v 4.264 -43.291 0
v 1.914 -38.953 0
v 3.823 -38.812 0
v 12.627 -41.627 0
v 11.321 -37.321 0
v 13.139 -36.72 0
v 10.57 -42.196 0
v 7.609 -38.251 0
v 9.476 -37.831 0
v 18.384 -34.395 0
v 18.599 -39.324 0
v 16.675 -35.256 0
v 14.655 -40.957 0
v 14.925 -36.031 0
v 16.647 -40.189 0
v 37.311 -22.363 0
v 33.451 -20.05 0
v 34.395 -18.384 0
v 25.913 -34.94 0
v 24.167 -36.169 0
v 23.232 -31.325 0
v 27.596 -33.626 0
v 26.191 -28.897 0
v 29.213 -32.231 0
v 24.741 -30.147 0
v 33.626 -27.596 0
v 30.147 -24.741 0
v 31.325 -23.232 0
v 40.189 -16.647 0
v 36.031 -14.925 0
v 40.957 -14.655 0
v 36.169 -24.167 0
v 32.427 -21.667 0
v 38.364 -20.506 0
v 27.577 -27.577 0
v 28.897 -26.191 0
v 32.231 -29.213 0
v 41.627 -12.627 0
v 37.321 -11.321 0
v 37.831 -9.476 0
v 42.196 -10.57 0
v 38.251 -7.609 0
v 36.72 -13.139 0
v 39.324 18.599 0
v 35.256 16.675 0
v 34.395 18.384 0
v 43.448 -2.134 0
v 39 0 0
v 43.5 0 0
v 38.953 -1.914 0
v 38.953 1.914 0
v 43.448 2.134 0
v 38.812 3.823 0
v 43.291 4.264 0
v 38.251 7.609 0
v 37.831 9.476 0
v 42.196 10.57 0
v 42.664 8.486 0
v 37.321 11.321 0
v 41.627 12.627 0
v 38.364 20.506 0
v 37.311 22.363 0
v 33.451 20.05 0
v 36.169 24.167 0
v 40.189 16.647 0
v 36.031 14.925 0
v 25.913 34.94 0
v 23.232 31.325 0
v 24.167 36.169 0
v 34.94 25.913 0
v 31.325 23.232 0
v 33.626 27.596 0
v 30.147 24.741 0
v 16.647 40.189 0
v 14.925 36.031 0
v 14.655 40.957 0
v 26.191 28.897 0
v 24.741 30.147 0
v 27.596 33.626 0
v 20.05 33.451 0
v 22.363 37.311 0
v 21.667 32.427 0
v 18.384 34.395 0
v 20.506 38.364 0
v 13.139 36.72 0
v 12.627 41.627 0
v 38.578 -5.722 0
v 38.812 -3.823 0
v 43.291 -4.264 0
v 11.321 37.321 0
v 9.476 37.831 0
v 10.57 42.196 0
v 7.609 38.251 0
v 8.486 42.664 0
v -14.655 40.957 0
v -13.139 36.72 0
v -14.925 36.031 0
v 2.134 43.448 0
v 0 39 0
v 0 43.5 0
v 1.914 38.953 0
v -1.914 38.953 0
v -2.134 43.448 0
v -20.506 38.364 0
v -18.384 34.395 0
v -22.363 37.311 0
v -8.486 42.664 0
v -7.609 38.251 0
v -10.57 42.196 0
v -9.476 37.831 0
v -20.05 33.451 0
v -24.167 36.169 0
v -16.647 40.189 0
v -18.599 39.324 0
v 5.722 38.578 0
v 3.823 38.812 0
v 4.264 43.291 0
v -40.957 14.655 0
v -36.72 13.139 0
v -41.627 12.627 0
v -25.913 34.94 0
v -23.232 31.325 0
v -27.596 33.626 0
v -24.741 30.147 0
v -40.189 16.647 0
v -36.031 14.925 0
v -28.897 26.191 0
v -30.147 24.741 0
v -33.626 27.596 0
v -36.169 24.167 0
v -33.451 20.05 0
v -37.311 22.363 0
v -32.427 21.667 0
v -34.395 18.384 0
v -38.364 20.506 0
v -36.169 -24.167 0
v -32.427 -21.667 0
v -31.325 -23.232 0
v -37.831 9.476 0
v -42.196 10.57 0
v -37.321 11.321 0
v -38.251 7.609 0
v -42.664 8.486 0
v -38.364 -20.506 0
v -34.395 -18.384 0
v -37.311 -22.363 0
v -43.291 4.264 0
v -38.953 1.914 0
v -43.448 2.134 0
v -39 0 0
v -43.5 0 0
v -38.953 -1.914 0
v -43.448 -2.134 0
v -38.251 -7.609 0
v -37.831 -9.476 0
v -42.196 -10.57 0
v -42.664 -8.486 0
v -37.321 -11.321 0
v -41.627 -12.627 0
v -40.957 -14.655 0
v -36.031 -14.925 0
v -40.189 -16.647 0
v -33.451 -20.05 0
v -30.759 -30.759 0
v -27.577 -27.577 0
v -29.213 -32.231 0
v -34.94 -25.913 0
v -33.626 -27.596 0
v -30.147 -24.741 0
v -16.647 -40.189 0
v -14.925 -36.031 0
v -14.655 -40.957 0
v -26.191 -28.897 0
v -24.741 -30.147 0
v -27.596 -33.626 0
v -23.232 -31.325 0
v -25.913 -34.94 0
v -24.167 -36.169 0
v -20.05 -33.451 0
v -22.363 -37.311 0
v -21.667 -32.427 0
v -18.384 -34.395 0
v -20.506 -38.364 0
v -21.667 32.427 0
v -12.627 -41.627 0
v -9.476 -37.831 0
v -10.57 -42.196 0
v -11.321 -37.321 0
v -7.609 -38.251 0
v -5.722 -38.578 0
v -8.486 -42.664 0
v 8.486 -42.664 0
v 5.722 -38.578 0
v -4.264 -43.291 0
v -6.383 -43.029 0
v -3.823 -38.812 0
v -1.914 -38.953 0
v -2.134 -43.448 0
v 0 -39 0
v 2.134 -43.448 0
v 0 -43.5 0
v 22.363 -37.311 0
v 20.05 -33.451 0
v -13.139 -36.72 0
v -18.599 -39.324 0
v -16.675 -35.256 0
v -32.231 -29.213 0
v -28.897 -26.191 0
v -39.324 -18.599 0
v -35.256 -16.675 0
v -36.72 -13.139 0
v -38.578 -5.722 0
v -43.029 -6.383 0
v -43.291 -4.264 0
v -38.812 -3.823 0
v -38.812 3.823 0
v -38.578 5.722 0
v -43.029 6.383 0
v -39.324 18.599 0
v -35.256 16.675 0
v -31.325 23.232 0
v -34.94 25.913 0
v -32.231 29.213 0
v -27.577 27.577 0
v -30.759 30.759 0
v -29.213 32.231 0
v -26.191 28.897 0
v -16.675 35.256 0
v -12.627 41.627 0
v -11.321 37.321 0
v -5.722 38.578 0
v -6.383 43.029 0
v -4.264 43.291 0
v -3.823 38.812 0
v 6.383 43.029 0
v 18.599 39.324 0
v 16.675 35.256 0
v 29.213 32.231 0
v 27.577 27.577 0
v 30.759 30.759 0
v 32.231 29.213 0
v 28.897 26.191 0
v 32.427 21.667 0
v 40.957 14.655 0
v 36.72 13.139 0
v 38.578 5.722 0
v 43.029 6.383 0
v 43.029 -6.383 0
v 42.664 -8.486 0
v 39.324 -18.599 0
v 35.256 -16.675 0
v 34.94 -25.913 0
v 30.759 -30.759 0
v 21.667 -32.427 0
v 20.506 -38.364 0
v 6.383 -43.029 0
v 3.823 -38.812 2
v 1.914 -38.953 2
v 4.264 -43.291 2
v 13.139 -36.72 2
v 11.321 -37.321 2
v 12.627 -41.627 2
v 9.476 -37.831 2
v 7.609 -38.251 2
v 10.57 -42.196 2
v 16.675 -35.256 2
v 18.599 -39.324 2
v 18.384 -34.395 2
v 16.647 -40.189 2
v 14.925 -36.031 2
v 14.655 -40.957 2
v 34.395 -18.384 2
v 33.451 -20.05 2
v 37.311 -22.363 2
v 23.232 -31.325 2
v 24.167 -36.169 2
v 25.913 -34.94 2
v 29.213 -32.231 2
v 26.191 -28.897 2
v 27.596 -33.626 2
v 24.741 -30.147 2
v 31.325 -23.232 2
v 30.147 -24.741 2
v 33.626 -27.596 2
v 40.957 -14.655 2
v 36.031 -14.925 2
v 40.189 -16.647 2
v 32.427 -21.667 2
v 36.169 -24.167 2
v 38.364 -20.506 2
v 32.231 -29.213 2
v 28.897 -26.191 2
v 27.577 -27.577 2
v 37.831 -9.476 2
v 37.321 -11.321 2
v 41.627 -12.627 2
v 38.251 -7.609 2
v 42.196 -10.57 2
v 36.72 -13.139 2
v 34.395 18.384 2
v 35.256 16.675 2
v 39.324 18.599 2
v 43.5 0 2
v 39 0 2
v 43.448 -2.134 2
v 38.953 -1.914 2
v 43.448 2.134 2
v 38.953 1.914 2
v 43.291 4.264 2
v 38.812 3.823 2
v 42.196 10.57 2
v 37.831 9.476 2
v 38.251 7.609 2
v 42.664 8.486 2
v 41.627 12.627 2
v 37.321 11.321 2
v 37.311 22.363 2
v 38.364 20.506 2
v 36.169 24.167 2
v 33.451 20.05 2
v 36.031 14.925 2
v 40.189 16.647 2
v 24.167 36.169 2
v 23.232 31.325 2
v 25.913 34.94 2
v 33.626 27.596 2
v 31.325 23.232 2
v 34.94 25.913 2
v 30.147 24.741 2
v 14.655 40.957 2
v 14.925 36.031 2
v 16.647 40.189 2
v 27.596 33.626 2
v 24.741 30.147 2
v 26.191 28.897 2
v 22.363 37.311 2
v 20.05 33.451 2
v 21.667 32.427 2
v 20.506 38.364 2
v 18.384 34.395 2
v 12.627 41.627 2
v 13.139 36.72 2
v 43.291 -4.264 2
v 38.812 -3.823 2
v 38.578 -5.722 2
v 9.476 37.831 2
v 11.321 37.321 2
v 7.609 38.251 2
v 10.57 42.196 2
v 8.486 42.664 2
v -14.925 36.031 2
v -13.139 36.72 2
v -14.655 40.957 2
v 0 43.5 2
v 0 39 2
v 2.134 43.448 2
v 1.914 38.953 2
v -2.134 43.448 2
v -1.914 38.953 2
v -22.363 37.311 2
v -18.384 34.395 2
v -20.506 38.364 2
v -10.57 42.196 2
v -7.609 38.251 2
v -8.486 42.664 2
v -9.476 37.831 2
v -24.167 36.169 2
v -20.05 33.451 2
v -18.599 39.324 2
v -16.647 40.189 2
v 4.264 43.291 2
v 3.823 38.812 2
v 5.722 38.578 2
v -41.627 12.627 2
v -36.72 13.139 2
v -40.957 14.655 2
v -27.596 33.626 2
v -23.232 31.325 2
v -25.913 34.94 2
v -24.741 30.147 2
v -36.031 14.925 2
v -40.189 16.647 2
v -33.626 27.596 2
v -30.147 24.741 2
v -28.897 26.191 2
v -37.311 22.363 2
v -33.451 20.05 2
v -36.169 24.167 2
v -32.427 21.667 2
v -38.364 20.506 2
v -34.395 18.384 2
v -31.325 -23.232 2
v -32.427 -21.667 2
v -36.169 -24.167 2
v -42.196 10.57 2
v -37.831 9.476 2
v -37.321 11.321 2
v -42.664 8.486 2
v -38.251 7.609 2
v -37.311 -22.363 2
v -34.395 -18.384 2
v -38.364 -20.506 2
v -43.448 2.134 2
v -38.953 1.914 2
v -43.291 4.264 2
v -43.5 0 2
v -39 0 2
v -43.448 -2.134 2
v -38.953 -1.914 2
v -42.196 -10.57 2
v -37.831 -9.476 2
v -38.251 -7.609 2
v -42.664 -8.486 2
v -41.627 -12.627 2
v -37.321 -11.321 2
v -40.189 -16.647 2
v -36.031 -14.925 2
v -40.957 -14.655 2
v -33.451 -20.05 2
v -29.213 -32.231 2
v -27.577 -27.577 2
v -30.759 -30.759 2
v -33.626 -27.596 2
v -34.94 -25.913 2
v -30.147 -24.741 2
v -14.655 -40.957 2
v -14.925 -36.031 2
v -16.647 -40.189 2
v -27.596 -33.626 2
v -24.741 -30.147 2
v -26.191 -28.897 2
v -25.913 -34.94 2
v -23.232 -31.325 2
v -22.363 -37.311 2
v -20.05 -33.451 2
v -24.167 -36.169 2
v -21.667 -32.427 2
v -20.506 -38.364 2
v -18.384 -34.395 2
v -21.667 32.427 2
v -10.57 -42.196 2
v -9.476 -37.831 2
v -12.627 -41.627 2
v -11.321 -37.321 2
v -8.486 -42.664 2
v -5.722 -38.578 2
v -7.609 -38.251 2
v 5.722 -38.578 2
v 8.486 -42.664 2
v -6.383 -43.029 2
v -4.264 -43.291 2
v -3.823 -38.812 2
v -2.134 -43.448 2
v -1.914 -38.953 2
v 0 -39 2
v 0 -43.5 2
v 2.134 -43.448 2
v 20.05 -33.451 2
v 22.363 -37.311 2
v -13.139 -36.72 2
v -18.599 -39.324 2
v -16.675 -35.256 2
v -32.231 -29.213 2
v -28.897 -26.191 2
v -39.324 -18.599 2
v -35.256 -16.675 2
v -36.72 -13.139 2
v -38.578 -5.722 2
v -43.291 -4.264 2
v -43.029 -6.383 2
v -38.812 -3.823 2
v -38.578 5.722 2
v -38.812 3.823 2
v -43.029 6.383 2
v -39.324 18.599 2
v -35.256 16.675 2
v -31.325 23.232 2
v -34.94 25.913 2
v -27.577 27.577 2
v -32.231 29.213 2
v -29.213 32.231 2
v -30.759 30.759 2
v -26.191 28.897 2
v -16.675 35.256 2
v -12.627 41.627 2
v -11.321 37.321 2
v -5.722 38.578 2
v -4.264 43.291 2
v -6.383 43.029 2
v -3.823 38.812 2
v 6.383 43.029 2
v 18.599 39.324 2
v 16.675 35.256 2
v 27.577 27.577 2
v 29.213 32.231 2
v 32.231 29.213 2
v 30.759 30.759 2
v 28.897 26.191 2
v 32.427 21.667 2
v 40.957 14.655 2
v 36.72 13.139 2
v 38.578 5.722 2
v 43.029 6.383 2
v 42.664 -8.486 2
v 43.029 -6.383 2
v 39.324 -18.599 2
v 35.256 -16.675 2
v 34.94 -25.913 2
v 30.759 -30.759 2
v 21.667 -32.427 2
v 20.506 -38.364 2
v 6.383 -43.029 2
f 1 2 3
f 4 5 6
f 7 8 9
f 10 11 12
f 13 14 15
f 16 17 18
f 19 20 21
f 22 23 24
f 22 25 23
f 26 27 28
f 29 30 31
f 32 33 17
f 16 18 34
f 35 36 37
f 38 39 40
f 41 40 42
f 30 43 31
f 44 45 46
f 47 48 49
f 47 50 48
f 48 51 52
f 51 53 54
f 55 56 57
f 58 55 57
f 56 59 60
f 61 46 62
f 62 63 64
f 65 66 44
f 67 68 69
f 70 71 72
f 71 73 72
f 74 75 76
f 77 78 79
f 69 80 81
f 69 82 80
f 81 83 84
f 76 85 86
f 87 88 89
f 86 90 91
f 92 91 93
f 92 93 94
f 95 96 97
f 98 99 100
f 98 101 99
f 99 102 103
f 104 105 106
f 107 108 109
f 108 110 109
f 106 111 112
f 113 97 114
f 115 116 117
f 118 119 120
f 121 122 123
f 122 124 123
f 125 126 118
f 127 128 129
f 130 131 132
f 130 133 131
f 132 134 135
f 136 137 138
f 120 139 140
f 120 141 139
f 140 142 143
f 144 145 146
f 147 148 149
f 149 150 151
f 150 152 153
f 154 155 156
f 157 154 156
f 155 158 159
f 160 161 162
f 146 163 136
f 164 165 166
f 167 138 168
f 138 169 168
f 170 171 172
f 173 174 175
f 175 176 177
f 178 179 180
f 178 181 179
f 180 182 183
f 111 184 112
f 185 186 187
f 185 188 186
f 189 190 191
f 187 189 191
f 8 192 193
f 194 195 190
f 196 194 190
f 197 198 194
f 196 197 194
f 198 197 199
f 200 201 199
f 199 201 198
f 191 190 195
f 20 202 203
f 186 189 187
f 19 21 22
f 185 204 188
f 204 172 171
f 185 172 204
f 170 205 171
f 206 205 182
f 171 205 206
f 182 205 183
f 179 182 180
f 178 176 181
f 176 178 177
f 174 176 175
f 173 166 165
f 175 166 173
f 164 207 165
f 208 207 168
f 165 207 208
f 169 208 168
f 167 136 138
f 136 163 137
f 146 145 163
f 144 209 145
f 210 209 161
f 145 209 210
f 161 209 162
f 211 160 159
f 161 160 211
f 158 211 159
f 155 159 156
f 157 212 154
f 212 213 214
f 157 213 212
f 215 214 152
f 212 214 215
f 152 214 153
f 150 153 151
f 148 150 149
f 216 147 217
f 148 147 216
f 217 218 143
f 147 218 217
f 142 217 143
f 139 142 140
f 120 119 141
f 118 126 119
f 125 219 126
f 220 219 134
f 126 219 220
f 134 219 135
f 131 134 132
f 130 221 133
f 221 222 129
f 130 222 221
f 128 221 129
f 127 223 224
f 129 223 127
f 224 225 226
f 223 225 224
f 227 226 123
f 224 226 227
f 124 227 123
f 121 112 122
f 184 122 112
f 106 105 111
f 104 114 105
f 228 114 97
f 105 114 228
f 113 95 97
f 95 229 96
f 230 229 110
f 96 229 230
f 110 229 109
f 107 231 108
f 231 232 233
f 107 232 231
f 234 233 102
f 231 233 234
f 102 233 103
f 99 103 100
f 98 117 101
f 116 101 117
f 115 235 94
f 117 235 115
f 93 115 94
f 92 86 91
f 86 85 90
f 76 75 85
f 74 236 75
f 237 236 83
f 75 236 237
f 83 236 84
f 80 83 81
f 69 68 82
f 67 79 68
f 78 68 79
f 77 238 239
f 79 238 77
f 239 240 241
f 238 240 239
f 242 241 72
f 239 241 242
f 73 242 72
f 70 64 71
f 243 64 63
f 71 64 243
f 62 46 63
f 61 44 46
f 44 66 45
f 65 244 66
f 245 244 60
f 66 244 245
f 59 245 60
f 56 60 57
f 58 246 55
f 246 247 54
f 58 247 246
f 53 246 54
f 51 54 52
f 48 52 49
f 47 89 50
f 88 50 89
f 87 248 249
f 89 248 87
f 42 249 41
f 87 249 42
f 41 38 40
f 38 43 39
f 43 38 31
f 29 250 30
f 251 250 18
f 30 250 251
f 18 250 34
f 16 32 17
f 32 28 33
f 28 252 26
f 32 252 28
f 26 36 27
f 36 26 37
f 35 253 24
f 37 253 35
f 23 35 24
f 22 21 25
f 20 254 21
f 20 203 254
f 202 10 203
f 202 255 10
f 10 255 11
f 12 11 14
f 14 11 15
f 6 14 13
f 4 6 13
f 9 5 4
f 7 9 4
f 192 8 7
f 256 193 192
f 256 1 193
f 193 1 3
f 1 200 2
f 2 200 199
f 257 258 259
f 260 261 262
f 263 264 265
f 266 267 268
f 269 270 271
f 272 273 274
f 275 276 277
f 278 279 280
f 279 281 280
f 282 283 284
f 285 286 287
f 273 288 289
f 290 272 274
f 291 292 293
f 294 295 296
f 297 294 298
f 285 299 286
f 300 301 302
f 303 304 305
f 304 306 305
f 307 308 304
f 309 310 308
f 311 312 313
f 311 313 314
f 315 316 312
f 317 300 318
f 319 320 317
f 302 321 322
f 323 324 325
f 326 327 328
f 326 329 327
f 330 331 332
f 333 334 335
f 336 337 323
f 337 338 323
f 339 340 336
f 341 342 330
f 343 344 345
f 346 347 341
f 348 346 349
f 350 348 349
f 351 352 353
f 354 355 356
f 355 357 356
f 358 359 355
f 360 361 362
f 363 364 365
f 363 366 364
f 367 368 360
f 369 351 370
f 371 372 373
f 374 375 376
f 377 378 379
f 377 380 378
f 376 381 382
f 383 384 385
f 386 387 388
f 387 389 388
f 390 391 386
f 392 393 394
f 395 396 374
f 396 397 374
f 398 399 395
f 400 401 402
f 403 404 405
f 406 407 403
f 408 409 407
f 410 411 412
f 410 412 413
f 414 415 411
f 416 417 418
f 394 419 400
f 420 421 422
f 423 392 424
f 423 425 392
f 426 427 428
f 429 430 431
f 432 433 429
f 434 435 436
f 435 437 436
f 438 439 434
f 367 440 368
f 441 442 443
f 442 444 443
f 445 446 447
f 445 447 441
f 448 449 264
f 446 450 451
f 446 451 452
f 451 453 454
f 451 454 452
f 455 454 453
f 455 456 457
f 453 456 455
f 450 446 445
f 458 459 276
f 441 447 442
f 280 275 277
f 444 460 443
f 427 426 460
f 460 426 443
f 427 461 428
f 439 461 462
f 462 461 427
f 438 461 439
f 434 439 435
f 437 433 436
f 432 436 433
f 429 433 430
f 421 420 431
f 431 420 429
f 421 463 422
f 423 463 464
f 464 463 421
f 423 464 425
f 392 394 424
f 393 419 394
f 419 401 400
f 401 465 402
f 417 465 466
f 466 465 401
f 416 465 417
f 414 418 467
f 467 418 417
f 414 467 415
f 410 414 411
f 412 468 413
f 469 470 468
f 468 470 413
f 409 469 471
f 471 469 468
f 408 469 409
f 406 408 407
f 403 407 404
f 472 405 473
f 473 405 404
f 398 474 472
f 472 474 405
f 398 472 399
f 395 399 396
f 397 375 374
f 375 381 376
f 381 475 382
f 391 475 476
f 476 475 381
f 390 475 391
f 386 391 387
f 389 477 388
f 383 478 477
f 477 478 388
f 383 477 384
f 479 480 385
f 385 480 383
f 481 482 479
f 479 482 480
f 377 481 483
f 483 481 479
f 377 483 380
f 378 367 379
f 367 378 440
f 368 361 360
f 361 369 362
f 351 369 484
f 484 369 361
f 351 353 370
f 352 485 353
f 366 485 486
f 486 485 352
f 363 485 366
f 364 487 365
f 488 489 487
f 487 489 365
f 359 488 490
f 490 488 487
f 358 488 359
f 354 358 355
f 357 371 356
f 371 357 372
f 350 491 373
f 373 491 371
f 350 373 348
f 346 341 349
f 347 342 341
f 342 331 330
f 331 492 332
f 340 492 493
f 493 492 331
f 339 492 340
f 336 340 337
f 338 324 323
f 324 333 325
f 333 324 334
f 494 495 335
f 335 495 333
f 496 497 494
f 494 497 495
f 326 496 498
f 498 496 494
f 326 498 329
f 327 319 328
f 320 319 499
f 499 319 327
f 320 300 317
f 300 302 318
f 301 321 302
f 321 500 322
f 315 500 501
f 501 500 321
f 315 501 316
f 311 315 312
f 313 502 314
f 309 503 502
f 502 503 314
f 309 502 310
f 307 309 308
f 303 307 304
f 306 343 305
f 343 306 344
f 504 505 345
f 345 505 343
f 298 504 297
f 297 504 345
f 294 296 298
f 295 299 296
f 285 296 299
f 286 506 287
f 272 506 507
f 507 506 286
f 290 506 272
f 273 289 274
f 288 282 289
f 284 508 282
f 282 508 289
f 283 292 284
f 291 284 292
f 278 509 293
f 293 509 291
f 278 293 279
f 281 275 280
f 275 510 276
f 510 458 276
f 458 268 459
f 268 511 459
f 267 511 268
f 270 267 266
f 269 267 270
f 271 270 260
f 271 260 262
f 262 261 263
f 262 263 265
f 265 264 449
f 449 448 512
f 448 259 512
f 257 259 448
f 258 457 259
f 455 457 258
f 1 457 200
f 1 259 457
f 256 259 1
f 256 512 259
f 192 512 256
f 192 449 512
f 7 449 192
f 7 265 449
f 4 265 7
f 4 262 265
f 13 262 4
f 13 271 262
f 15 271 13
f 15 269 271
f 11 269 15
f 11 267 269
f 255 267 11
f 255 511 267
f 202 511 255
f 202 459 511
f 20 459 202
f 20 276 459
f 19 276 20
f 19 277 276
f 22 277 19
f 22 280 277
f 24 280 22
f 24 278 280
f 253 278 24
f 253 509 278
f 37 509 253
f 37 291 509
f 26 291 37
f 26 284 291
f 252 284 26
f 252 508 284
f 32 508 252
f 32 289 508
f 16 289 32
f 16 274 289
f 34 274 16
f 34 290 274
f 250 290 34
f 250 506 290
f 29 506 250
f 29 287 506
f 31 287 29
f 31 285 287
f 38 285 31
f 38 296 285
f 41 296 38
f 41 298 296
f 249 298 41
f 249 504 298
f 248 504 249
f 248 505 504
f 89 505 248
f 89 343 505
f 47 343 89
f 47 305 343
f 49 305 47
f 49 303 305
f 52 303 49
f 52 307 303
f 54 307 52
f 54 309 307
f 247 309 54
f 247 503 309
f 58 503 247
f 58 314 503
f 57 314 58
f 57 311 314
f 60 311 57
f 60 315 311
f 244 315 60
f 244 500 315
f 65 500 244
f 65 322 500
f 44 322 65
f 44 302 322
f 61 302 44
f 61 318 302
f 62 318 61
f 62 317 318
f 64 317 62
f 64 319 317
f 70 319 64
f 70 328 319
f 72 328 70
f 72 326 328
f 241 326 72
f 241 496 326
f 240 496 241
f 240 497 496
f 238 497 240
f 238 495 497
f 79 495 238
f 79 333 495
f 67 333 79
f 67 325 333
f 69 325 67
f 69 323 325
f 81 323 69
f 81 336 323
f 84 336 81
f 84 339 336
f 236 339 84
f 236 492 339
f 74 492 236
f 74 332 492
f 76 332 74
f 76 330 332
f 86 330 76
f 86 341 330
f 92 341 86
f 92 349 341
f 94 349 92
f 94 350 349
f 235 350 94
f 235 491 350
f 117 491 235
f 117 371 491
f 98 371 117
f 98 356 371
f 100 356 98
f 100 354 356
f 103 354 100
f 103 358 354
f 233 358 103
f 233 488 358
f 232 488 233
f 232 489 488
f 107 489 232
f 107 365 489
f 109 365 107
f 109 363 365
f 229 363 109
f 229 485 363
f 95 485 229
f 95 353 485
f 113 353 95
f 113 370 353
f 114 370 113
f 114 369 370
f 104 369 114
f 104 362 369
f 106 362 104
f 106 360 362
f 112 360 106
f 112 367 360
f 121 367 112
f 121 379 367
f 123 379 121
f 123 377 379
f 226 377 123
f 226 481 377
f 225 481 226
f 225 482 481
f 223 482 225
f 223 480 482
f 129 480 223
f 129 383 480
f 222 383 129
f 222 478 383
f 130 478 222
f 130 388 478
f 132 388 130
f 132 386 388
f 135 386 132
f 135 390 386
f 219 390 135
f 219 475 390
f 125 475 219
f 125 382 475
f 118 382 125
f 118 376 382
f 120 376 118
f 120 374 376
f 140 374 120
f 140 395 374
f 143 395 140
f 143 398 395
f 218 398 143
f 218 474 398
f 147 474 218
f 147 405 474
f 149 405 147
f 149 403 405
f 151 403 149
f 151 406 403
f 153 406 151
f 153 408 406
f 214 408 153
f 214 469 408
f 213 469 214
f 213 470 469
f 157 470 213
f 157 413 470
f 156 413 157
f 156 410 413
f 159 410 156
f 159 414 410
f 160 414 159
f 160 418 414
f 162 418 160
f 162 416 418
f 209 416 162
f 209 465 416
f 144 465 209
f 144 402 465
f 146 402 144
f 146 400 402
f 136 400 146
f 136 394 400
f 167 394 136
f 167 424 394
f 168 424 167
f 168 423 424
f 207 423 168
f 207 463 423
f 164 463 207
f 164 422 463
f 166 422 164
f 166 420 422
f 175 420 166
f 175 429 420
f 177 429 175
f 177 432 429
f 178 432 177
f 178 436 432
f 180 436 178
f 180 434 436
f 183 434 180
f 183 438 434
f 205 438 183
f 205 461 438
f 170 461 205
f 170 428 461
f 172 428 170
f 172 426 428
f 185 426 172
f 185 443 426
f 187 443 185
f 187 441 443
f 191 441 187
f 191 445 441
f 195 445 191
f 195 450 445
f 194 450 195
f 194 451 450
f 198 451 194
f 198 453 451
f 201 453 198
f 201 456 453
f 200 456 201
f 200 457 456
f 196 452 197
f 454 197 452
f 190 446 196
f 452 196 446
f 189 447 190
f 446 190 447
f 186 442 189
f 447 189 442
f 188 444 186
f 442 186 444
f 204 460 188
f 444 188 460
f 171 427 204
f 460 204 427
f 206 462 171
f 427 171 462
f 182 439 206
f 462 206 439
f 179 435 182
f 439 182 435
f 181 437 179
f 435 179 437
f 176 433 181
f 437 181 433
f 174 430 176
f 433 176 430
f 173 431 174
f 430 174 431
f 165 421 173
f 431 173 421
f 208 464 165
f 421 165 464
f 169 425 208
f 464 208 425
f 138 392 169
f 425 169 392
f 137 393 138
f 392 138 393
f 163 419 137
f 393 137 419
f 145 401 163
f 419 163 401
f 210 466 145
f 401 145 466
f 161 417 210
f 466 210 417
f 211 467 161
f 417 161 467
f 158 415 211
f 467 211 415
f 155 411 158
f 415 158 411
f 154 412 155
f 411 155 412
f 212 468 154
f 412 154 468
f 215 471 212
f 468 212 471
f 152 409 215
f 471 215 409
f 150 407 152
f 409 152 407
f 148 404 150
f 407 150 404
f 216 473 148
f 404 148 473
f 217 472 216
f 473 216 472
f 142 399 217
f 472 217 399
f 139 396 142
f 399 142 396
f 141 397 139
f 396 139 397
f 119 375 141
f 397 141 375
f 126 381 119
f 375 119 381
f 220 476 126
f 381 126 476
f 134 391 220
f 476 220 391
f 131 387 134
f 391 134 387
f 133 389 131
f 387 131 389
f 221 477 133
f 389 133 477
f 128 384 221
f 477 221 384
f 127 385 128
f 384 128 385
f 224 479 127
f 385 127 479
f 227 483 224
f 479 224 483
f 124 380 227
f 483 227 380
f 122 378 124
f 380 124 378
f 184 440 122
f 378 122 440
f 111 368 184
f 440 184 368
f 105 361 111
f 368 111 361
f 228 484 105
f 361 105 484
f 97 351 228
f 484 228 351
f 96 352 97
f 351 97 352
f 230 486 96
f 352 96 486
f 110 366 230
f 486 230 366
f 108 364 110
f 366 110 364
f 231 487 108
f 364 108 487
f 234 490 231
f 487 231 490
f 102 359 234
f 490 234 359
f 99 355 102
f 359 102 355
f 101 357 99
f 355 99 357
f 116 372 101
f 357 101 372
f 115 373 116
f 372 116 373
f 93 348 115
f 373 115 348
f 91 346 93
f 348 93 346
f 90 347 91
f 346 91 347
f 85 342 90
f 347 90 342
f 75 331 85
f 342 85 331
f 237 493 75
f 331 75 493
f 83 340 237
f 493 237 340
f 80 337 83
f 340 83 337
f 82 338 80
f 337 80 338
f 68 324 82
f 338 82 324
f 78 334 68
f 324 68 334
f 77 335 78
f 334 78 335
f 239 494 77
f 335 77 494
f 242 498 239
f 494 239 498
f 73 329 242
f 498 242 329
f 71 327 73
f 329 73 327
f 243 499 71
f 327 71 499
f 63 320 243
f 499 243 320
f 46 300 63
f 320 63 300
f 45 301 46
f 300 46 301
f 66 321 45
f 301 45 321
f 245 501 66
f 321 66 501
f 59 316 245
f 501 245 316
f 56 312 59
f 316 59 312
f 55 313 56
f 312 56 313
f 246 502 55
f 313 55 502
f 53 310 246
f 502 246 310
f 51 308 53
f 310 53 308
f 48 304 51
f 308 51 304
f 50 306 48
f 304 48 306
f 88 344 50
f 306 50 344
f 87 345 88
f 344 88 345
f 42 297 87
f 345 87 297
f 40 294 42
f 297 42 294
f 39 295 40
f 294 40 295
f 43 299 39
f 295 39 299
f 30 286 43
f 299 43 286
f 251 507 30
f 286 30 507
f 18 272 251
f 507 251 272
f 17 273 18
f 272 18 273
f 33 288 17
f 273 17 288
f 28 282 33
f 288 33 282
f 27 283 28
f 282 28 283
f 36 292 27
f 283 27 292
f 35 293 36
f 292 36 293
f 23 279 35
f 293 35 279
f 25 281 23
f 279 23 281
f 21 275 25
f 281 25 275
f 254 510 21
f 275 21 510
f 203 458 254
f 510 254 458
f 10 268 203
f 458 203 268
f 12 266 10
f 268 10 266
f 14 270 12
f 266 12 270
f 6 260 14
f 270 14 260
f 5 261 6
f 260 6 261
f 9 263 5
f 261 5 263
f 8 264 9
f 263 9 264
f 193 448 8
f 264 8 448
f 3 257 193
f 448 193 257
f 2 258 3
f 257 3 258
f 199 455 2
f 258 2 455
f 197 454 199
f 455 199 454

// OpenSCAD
d1=78;
d2=87;
h=2;

res=128;

linear_extrude(h)
difference(){
  circle(d=d2, $fn=res);
  circle(d=d1, $fn=res);
}
